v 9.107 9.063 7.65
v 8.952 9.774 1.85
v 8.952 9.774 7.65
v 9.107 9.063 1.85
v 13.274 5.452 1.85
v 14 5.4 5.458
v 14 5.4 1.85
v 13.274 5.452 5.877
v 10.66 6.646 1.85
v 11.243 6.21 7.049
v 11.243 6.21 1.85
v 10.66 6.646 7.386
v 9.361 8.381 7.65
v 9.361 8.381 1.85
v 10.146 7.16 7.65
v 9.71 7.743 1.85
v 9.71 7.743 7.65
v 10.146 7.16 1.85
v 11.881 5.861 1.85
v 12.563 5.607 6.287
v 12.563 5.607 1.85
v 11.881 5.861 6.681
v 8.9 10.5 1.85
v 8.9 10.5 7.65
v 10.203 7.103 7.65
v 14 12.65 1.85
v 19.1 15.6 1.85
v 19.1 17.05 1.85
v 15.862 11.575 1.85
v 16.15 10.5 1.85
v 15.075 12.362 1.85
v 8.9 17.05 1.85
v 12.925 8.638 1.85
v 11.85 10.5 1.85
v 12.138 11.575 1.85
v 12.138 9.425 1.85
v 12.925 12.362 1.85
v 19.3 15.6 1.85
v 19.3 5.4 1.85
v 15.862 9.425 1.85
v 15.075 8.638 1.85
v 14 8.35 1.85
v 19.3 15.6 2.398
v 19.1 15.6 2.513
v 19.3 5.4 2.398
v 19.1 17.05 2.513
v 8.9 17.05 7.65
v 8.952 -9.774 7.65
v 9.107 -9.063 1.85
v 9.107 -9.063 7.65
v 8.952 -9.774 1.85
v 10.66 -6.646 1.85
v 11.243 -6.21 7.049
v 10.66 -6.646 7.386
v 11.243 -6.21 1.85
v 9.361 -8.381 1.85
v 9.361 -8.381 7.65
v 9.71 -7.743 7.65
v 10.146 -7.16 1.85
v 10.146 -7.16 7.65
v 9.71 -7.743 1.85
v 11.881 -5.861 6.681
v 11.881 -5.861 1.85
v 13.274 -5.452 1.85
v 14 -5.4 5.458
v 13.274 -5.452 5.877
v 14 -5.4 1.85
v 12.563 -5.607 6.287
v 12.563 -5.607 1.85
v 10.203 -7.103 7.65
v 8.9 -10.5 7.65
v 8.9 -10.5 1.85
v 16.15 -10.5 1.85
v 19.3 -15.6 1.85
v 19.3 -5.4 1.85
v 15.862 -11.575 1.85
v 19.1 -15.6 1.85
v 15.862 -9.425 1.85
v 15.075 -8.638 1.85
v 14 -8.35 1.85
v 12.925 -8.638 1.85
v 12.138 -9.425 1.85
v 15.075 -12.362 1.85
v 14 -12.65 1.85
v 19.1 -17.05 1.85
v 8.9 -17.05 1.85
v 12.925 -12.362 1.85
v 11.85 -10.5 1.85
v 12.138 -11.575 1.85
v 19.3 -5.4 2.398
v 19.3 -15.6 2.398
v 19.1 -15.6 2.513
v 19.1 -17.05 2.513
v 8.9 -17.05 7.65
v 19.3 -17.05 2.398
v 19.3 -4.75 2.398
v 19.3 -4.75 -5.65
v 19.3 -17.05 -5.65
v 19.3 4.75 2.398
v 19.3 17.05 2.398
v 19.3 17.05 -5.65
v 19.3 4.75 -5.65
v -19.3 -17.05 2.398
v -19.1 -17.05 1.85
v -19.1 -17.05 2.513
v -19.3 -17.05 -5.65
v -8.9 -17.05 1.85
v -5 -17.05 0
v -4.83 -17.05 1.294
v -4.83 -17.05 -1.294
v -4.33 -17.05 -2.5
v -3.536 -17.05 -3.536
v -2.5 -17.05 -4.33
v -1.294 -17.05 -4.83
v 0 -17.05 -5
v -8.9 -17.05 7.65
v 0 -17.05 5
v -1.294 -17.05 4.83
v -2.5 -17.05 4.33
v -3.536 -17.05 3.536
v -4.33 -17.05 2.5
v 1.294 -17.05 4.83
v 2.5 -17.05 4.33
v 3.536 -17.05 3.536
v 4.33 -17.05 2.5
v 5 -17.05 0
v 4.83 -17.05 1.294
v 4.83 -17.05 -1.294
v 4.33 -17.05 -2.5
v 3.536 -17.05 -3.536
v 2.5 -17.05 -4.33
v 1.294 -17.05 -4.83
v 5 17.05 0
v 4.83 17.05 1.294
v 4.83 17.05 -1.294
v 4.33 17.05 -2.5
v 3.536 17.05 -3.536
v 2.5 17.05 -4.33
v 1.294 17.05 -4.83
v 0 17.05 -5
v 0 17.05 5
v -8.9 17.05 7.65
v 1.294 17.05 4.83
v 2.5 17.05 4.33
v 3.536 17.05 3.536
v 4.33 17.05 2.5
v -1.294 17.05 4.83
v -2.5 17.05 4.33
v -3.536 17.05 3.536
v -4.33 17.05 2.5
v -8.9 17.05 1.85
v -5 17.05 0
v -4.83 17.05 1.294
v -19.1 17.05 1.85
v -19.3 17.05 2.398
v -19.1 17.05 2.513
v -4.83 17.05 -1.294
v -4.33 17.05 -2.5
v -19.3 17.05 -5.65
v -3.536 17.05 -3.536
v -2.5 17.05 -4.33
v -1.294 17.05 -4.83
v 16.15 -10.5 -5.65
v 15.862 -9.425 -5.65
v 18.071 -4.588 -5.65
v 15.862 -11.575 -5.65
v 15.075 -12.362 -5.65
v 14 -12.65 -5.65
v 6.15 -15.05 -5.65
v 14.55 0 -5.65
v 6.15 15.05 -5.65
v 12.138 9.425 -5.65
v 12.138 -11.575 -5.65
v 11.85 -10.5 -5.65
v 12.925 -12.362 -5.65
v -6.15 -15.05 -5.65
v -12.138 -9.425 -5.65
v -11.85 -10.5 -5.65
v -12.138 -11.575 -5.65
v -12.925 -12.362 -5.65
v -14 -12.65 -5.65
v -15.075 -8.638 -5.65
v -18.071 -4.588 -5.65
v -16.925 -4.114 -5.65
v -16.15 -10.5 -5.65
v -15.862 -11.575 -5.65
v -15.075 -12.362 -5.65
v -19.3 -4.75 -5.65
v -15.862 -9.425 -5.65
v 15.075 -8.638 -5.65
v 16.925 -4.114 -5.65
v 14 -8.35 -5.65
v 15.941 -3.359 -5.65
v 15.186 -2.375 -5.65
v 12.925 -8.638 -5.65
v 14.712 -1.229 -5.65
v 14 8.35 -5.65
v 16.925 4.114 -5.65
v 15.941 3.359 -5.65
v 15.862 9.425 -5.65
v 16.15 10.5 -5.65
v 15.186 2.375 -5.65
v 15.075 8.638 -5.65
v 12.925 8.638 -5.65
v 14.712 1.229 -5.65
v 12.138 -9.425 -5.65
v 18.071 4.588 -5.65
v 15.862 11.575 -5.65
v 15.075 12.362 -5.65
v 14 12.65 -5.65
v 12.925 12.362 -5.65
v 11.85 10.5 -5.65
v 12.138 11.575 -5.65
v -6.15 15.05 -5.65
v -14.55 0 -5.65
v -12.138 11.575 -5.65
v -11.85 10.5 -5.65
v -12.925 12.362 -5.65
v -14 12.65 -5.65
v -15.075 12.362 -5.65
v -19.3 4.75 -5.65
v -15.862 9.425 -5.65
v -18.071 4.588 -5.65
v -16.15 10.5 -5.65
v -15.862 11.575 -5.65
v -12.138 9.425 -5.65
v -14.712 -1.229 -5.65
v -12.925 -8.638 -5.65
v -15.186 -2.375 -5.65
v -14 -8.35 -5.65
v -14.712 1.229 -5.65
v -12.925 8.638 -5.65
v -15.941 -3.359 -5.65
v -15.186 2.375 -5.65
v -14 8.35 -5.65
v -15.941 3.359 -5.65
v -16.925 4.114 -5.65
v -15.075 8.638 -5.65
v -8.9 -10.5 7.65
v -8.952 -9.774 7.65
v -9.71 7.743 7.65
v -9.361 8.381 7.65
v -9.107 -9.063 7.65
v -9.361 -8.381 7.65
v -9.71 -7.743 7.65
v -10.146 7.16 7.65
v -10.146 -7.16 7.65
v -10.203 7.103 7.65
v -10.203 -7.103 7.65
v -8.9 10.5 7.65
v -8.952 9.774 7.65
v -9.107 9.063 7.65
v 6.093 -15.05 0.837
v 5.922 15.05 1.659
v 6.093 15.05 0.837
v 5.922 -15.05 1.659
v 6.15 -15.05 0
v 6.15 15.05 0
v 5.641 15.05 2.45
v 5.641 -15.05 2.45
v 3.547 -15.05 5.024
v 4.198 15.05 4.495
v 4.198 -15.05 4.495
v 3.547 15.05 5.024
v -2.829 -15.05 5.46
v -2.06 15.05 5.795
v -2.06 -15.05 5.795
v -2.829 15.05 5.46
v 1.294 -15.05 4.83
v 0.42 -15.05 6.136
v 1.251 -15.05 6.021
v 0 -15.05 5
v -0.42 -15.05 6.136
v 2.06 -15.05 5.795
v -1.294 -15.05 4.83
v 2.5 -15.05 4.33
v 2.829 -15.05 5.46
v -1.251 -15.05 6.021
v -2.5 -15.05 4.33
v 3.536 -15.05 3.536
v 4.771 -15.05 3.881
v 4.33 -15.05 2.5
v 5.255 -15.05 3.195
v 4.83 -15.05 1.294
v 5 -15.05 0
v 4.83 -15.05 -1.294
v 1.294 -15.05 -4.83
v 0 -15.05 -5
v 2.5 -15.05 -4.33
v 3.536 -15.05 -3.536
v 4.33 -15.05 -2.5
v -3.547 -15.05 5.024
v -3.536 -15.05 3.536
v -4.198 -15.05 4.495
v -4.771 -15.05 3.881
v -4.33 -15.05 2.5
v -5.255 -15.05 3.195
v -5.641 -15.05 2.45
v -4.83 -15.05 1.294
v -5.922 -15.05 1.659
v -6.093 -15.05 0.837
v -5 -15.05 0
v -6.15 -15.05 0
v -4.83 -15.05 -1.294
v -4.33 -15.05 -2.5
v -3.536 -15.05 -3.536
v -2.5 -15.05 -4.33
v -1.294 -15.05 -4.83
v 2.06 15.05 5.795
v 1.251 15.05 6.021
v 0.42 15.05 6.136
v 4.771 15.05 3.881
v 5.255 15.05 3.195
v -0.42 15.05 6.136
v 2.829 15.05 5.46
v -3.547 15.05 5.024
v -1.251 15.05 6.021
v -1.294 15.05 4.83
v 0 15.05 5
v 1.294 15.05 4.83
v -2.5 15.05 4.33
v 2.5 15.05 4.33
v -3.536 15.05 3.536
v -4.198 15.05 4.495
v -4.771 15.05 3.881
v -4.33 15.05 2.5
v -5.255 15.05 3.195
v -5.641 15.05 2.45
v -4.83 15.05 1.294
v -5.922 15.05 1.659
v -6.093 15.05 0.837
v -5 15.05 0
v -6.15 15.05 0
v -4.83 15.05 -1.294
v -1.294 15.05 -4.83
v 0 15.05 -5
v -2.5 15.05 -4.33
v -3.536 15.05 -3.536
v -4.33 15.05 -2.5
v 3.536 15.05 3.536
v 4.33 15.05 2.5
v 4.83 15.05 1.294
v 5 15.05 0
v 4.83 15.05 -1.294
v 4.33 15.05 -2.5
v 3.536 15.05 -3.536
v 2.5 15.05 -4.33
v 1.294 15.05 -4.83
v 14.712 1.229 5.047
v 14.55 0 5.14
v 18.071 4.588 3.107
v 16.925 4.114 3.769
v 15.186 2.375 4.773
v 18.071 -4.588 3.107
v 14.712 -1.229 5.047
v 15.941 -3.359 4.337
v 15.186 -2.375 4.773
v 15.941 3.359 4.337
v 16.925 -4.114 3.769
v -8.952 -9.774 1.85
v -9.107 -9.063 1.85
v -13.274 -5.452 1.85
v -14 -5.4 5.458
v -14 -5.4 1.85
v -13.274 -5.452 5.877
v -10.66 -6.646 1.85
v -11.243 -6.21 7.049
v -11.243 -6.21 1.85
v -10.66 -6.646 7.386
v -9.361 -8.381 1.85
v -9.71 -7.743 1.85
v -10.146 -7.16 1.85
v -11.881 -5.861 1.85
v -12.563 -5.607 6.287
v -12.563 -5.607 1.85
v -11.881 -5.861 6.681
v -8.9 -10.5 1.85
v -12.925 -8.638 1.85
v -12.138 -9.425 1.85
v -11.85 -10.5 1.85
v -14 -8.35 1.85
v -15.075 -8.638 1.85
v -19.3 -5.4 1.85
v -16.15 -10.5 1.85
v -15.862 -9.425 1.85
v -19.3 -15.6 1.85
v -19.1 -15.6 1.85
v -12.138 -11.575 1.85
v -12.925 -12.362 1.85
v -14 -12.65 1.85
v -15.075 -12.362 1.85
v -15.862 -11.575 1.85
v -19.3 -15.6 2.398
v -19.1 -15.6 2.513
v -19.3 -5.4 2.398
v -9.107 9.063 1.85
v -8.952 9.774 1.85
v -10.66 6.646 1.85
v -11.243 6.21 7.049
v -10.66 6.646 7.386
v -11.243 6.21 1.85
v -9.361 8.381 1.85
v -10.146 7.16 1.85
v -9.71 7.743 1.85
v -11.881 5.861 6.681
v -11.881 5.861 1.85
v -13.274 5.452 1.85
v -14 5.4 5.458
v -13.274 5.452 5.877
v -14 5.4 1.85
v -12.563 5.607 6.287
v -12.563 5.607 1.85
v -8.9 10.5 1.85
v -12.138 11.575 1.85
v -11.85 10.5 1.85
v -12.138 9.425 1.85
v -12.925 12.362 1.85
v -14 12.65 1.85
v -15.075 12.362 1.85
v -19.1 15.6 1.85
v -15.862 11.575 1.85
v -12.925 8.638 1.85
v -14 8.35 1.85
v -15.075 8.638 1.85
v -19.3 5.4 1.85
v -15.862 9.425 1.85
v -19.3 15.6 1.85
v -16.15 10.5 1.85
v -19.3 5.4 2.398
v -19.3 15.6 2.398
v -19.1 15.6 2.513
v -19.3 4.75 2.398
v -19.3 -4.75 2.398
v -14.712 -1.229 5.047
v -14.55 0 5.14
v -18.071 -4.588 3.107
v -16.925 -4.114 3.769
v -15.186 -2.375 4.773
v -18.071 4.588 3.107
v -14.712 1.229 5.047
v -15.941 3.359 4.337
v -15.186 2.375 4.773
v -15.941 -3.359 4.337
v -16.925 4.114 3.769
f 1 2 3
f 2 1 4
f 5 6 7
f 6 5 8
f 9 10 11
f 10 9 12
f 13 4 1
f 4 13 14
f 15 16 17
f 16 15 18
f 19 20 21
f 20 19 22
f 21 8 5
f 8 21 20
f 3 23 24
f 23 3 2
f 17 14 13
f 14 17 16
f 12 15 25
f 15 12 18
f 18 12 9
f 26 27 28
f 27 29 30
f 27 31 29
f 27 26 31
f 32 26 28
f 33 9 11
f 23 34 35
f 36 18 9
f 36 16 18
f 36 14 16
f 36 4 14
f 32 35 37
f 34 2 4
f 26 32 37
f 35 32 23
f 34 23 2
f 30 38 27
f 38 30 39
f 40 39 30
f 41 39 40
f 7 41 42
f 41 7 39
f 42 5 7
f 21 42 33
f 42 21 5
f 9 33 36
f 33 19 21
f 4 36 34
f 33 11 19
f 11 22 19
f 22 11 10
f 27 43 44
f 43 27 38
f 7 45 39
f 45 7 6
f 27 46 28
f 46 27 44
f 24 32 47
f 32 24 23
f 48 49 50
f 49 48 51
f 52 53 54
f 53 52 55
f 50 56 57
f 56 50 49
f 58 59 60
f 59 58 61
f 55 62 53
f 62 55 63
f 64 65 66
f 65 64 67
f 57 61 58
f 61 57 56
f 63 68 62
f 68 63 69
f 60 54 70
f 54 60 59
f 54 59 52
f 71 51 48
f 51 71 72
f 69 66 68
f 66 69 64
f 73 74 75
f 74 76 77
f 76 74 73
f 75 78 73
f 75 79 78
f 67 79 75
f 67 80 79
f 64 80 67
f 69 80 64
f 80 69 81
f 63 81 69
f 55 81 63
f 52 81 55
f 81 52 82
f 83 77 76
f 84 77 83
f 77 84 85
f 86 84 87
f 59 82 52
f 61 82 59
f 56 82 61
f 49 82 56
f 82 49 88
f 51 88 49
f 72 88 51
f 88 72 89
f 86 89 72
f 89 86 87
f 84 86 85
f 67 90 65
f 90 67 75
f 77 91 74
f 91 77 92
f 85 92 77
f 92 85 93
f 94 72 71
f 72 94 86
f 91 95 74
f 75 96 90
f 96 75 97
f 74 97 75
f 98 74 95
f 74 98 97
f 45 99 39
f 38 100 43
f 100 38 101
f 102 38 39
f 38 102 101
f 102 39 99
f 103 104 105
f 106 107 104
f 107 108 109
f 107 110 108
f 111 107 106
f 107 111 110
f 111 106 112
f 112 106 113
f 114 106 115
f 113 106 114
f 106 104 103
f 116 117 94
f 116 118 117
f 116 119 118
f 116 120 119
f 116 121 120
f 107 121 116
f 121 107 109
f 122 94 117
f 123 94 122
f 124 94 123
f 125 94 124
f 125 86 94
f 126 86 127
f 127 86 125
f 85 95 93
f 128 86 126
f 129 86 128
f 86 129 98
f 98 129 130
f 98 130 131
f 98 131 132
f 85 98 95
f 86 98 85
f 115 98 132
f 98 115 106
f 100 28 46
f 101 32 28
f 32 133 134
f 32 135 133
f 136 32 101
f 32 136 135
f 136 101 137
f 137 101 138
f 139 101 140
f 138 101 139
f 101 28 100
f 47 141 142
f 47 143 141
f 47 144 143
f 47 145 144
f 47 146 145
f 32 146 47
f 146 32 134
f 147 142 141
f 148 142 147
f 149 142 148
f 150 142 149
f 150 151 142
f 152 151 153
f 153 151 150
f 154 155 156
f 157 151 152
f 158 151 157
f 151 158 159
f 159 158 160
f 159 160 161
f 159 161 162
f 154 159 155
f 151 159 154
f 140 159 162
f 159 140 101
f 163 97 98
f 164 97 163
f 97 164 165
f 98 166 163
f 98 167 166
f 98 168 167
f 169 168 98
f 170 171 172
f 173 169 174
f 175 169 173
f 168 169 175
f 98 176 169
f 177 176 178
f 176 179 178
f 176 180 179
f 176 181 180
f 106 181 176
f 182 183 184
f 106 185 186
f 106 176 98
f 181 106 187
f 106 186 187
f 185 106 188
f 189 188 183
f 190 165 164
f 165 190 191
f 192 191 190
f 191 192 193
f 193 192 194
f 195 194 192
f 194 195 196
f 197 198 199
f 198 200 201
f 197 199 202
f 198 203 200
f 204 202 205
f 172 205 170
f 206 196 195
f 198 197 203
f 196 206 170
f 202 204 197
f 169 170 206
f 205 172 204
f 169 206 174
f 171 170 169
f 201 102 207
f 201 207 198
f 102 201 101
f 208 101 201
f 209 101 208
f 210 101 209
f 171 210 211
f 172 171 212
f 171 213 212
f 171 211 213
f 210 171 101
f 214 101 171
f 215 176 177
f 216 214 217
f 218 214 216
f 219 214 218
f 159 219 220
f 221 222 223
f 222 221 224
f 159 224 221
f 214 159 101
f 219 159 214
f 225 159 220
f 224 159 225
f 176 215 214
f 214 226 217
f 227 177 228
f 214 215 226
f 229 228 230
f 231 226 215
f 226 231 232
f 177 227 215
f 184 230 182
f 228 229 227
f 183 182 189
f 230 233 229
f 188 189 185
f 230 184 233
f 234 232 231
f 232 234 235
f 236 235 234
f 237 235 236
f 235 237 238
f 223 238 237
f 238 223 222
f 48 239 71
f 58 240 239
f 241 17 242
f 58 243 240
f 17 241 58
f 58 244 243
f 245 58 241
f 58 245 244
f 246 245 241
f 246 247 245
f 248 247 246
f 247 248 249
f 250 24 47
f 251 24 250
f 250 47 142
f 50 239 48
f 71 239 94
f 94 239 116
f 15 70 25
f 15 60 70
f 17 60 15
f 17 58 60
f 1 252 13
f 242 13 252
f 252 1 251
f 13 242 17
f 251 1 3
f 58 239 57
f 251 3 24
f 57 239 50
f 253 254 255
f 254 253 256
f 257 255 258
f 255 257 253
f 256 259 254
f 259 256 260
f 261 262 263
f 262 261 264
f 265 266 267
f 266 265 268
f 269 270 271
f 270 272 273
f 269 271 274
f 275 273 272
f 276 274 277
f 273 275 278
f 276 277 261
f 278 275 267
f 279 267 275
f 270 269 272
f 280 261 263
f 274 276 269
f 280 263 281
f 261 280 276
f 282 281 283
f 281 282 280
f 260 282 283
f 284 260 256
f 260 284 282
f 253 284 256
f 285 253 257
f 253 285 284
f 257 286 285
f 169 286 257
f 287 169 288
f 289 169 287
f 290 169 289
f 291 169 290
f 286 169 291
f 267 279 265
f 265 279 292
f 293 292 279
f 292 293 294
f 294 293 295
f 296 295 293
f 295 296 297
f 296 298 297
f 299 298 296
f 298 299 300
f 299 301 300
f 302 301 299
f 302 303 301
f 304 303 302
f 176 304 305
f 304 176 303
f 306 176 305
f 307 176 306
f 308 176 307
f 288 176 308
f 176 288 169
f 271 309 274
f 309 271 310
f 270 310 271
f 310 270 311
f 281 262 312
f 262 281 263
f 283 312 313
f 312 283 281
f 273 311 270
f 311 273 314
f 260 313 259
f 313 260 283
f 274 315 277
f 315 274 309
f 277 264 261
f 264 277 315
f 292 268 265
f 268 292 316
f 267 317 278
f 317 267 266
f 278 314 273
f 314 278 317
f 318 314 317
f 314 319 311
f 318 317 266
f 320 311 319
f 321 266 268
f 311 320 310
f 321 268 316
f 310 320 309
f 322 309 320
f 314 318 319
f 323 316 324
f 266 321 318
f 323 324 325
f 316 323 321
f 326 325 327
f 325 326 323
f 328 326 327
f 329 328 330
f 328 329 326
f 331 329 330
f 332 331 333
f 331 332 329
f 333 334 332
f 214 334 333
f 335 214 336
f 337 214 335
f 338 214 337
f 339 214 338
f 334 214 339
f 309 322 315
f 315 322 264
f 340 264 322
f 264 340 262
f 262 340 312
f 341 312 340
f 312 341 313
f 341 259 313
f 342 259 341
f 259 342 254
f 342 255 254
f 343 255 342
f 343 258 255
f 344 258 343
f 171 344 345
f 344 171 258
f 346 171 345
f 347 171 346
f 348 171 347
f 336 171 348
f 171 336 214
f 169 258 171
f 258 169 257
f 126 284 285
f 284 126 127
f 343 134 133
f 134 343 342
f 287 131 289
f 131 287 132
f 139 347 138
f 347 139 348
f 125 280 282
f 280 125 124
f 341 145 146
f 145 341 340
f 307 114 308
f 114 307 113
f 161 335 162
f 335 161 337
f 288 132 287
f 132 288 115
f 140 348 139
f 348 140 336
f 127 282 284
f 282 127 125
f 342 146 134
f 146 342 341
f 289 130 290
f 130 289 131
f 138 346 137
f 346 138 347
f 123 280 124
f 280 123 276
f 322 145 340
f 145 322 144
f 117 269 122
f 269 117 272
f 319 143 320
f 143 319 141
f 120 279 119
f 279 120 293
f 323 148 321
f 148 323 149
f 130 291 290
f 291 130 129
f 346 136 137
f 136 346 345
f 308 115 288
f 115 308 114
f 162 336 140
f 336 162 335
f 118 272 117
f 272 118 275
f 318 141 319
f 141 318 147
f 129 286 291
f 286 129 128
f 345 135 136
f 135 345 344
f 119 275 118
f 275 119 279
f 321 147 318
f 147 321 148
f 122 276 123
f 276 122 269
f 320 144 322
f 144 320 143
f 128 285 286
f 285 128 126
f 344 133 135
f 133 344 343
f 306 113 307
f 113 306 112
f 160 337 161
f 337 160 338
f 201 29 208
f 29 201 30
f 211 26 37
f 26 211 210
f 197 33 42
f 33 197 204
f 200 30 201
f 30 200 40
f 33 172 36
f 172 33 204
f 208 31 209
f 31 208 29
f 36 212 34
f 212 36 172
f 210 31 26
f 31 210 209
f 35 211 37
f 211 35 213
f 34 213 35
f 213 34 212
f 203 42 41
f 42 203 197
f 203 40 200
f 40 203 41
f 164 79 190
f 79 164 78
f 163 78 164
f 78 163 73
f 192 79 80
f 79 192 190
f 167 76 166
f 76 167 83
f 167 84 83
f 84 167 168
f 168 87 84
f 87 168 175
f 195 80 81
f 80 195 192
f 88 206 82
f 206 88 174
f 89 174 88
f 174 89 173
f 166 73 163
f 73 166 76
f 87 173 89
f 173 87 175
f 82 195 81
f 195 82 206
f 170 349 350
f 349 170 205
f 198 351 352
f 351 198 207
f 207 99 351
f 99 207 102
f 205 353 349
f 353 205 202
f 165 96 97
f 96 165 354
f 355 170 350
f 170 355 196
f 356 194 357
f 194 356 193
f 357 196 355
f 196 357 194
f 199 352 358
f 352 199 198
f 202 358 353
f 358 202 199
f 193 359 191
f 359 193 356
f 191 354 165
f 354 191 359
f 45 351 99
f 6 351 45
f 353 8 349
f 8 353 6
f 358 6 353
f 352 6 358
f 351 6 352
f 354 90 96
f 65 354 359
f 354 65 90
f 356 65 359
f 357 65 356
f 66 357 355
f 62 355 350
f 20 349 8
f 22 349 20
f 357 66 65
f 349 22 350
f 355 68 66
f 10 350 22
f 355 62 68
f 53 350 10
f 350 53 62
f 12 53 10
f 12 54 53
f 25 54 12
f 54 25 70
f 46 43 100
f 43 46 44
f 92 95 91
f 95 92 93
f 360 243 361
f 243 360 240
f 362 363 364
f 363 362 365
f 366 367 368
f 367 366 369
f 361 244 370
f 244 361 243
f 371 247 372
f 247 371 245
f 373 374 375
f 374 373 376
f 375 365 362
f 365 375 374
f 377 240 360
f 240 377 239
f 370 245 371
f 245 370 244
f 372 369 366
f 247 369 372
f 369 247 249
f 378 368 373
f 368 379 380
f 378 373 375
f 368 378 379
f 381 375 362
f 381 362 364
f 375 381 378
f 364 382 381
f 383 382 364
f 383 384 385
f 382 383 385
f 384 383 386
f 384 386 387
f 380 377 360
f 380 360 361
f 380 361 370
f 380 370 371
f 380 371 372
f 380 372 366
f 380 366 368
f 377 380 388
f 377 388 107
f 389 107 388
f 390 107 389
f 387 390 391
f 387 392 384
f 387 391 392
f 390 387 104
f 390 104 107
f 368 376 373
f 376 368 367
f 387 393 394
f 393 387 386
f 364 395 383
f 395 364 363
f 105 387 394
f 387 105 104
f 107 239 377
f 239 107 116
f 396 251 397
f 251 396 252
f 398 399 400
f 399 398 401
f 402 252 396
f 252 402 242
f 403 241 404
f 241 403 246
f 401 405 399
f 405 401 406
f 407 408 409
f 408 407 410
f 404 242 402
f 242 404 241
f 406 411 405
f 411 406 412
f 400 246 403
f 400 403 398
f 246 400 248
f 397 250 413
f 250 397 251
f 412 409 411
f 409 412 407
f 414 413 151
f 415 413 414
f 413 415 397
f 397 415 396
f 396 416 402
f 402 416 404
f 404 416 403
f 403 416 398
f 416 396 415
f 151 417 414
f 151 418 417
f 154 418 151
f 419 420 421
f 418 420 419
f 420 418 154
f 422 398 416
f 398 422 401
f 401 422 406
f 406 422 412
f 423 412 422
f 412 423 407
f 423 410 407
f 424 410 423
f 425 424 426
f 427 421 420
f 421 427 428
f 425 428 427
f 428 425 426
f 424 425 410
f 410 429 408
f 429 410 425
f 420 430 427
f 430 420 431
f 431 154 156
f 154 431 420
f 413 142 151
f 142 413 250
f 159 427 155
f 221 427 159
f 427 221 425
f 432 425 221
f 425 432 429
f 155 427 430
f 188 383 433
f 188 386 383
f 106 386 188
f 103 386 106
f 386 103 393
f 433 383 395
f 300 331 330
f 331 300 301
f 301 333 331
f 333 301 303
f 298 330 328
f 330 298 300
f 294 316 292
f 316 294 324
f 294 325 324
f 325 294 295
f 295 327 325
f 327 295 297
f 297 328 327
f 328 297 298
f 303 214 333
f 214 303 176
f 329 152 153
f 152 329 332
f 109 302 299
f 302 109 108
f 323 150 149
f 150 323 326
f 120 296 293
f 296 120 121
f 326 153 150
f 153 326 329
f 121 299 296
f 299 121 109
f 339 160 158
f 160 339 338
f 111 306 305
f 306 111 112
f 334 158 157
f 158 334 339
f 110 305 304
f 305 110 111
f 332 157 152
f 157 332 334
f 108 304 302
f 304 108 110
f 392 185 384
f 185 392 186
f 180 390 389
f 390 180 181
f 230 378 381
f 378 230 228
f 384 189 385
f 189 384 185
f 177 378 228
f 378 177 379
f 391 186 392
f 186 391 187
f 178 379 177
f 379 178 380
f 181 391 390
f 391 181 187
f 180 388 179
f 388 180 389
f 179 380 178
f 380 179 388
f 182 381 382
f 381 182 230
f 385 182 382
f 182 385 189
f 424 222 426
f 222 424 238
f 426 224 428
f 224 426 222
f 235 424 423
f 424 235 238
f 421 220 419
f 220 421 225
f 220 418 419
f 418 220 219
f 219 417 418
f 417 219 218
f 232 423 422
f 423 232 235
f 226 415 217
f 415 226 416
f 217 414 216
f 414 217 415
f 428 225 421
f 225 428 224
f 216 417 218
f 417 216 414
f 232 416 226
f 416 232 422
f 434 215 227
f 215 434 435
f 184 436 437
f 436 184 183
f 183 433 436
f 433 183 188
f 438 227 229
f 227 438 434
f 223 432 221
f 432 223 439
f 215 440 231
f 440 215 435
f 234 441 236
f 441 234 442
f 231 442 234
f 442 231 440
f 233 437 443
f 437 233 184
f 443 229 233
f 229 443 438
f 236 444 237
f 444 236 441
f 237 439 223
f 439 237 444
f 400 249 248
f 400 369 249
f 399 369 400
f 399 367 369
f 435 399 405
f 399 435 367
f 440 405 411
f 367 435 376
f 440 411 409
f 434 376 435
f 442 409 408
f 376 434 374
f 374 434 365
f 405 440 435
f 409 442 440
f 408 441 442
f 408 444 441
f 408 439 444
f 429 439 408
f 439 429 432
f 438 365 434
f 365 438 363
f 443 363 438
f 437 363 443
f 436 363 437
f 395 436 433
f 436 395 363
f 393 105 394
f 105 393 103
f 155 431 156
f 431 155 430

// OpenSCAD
//////////////////////////////////////////////////////////////////////////////////////////////
// Zero height LM8UU bearing holder
//
// Copyright (C) 2013  Lochner, Juergen
// http://www.thingiverse.com/Ablapo/designs
//
// This program is free software; you can redistribute it and/or
// modify it under the terms of the GNU General Public License
// as published by the Free Software Foundation; either version 2
// of the License, or (at your option) any later version.
//
// This program is distributed in the hope that it will be useful,
// but WITHOUT ANY WARRANTY; without even the implied warranty of
// MERCHANTABILITY or FITNESS FOR A PARTICULAR PURPOSE.  See the
// GNU General Public License for more details.
//
// You should have received a copy of the GNU General Public License
// along with this program; if not, write to the Free Software
// Foundation, Inc., 51 Franklin Street, Fifth Floor, Boston, MA  02110-1301, USA.
/////////////////////////////////////////////////////////////////////////////////////////////////

// bearing's length
b_length=30.1;		
// bearing's diameter
b_dia= 12.3;		

// x distance of holes
dx=28;			
// y distance of holes	
dy=21;				

angle=60;			// holder cut off angle
b_angle=30;		// bearing cut off angle

bolt=3.9+0.4;		// M5 bolt diameter
nut=9.8+0.4; 		// washer's size 

rod=8+2;			// round cut at center rod
zcutoff=0;		// 0= cut height at bearing's height

boltlength=20-6-4-1-1;   // 20 mm bolt, 6 mm aluplate, 4mm nut, 1mm washer

module holder(){
intersection(){
	difference(){

		translate([b_dia/2+2,0,1.0]) rotate([90,0,0])cube ([b_dia+10,b_dia+1,b_length+5-1],center=true);
		rotate([90,0,0]) cylinder(h=b_length,r=b_dia/2,center=true,$fn=46);								// cut bearing
		translate([0 ,0,-b_dia/2]) rotate([90,0,0])cube ([b_dia,b_dia,b_length],center=true);			// cut below bearing

		#rotate([90,0,0]) cylinder(h=b_length+15,r=rod/2,center=true,$fn=24);								// cut center rod
 
		translate([dx/2,dy/2,0])cylinder(h=b_dia*3,r=bolt/2, center=true,$fn=12);						// cut bolt 1
		translate([dx/2,dy/2,0.5+boltlength])
			union(){
				cylinder(h=b_dia+1,r=nut/2, center=true,$fn=44);
				translate([nut/2,0,0])cube ([nut,nut,b_dia+1],center=true);
				translate([0,nut/2,0])cube ([nut,nut,b_dia+1],center=true);
			}
	
		translate([dx/2,-dy/2,0])cylinder(h=b_dia*3,r=bolt/2, center=true,$fn=12);						// cut bolt 2
		translate([dx/2,-dy/2,0.5+boltlength])
			union(){
				cylinder(h=b_dia+1,r=nut/2, center=true,$fn=44);
				translate([ nut/2,0,0])cube ([nut,nut,b_dia+1],center=true);
				translate([0,-nut/2,0])cube ([nut,nut,b_dia+1],center=true);
			}


		translate([b_dia+7,0,0]) cylinder(h=b_length+15,r=9.5/2,center=true,$fn=24);						// slim cut

		translate([b_dia+8,0,0.4])rotate([0,-angle,0])translate([b_dia*1.6,0,b_dia*1.5])cube([b_dia*3,b_length+8+1,b_dia*3],center=true); // cut holder angle
		//rotate([0,b_angle,0])translate([-b_dia*1.5,0,b_dia*1.5])cube([b_dia*3,b_length+8+1,b_dia*3],center=true);		// cut bearing angle
		//translate([0,0,b_dia*1.5-b_dia/2+b_dia+zcutoff])cube([b_dia*3,b_length+8+1,b_dia*3],center=true);		// cut top

	}

	cylinder(h=b_dia*4,r=b_length-0.3,center=true,$fn=12);
}
}

module spacer(){
	difference(){
		cylinder(h=6,r=10/2-0.1,center=true,$fn=44);
		cylinder(h=7,r=8/2,center=true,$fn=44);
	}
}

module plate(){
	translate([0,0,0])holder();
	translate([0,0,0])rotate([0,0,180]) holder();
}

plate();
//holder();
